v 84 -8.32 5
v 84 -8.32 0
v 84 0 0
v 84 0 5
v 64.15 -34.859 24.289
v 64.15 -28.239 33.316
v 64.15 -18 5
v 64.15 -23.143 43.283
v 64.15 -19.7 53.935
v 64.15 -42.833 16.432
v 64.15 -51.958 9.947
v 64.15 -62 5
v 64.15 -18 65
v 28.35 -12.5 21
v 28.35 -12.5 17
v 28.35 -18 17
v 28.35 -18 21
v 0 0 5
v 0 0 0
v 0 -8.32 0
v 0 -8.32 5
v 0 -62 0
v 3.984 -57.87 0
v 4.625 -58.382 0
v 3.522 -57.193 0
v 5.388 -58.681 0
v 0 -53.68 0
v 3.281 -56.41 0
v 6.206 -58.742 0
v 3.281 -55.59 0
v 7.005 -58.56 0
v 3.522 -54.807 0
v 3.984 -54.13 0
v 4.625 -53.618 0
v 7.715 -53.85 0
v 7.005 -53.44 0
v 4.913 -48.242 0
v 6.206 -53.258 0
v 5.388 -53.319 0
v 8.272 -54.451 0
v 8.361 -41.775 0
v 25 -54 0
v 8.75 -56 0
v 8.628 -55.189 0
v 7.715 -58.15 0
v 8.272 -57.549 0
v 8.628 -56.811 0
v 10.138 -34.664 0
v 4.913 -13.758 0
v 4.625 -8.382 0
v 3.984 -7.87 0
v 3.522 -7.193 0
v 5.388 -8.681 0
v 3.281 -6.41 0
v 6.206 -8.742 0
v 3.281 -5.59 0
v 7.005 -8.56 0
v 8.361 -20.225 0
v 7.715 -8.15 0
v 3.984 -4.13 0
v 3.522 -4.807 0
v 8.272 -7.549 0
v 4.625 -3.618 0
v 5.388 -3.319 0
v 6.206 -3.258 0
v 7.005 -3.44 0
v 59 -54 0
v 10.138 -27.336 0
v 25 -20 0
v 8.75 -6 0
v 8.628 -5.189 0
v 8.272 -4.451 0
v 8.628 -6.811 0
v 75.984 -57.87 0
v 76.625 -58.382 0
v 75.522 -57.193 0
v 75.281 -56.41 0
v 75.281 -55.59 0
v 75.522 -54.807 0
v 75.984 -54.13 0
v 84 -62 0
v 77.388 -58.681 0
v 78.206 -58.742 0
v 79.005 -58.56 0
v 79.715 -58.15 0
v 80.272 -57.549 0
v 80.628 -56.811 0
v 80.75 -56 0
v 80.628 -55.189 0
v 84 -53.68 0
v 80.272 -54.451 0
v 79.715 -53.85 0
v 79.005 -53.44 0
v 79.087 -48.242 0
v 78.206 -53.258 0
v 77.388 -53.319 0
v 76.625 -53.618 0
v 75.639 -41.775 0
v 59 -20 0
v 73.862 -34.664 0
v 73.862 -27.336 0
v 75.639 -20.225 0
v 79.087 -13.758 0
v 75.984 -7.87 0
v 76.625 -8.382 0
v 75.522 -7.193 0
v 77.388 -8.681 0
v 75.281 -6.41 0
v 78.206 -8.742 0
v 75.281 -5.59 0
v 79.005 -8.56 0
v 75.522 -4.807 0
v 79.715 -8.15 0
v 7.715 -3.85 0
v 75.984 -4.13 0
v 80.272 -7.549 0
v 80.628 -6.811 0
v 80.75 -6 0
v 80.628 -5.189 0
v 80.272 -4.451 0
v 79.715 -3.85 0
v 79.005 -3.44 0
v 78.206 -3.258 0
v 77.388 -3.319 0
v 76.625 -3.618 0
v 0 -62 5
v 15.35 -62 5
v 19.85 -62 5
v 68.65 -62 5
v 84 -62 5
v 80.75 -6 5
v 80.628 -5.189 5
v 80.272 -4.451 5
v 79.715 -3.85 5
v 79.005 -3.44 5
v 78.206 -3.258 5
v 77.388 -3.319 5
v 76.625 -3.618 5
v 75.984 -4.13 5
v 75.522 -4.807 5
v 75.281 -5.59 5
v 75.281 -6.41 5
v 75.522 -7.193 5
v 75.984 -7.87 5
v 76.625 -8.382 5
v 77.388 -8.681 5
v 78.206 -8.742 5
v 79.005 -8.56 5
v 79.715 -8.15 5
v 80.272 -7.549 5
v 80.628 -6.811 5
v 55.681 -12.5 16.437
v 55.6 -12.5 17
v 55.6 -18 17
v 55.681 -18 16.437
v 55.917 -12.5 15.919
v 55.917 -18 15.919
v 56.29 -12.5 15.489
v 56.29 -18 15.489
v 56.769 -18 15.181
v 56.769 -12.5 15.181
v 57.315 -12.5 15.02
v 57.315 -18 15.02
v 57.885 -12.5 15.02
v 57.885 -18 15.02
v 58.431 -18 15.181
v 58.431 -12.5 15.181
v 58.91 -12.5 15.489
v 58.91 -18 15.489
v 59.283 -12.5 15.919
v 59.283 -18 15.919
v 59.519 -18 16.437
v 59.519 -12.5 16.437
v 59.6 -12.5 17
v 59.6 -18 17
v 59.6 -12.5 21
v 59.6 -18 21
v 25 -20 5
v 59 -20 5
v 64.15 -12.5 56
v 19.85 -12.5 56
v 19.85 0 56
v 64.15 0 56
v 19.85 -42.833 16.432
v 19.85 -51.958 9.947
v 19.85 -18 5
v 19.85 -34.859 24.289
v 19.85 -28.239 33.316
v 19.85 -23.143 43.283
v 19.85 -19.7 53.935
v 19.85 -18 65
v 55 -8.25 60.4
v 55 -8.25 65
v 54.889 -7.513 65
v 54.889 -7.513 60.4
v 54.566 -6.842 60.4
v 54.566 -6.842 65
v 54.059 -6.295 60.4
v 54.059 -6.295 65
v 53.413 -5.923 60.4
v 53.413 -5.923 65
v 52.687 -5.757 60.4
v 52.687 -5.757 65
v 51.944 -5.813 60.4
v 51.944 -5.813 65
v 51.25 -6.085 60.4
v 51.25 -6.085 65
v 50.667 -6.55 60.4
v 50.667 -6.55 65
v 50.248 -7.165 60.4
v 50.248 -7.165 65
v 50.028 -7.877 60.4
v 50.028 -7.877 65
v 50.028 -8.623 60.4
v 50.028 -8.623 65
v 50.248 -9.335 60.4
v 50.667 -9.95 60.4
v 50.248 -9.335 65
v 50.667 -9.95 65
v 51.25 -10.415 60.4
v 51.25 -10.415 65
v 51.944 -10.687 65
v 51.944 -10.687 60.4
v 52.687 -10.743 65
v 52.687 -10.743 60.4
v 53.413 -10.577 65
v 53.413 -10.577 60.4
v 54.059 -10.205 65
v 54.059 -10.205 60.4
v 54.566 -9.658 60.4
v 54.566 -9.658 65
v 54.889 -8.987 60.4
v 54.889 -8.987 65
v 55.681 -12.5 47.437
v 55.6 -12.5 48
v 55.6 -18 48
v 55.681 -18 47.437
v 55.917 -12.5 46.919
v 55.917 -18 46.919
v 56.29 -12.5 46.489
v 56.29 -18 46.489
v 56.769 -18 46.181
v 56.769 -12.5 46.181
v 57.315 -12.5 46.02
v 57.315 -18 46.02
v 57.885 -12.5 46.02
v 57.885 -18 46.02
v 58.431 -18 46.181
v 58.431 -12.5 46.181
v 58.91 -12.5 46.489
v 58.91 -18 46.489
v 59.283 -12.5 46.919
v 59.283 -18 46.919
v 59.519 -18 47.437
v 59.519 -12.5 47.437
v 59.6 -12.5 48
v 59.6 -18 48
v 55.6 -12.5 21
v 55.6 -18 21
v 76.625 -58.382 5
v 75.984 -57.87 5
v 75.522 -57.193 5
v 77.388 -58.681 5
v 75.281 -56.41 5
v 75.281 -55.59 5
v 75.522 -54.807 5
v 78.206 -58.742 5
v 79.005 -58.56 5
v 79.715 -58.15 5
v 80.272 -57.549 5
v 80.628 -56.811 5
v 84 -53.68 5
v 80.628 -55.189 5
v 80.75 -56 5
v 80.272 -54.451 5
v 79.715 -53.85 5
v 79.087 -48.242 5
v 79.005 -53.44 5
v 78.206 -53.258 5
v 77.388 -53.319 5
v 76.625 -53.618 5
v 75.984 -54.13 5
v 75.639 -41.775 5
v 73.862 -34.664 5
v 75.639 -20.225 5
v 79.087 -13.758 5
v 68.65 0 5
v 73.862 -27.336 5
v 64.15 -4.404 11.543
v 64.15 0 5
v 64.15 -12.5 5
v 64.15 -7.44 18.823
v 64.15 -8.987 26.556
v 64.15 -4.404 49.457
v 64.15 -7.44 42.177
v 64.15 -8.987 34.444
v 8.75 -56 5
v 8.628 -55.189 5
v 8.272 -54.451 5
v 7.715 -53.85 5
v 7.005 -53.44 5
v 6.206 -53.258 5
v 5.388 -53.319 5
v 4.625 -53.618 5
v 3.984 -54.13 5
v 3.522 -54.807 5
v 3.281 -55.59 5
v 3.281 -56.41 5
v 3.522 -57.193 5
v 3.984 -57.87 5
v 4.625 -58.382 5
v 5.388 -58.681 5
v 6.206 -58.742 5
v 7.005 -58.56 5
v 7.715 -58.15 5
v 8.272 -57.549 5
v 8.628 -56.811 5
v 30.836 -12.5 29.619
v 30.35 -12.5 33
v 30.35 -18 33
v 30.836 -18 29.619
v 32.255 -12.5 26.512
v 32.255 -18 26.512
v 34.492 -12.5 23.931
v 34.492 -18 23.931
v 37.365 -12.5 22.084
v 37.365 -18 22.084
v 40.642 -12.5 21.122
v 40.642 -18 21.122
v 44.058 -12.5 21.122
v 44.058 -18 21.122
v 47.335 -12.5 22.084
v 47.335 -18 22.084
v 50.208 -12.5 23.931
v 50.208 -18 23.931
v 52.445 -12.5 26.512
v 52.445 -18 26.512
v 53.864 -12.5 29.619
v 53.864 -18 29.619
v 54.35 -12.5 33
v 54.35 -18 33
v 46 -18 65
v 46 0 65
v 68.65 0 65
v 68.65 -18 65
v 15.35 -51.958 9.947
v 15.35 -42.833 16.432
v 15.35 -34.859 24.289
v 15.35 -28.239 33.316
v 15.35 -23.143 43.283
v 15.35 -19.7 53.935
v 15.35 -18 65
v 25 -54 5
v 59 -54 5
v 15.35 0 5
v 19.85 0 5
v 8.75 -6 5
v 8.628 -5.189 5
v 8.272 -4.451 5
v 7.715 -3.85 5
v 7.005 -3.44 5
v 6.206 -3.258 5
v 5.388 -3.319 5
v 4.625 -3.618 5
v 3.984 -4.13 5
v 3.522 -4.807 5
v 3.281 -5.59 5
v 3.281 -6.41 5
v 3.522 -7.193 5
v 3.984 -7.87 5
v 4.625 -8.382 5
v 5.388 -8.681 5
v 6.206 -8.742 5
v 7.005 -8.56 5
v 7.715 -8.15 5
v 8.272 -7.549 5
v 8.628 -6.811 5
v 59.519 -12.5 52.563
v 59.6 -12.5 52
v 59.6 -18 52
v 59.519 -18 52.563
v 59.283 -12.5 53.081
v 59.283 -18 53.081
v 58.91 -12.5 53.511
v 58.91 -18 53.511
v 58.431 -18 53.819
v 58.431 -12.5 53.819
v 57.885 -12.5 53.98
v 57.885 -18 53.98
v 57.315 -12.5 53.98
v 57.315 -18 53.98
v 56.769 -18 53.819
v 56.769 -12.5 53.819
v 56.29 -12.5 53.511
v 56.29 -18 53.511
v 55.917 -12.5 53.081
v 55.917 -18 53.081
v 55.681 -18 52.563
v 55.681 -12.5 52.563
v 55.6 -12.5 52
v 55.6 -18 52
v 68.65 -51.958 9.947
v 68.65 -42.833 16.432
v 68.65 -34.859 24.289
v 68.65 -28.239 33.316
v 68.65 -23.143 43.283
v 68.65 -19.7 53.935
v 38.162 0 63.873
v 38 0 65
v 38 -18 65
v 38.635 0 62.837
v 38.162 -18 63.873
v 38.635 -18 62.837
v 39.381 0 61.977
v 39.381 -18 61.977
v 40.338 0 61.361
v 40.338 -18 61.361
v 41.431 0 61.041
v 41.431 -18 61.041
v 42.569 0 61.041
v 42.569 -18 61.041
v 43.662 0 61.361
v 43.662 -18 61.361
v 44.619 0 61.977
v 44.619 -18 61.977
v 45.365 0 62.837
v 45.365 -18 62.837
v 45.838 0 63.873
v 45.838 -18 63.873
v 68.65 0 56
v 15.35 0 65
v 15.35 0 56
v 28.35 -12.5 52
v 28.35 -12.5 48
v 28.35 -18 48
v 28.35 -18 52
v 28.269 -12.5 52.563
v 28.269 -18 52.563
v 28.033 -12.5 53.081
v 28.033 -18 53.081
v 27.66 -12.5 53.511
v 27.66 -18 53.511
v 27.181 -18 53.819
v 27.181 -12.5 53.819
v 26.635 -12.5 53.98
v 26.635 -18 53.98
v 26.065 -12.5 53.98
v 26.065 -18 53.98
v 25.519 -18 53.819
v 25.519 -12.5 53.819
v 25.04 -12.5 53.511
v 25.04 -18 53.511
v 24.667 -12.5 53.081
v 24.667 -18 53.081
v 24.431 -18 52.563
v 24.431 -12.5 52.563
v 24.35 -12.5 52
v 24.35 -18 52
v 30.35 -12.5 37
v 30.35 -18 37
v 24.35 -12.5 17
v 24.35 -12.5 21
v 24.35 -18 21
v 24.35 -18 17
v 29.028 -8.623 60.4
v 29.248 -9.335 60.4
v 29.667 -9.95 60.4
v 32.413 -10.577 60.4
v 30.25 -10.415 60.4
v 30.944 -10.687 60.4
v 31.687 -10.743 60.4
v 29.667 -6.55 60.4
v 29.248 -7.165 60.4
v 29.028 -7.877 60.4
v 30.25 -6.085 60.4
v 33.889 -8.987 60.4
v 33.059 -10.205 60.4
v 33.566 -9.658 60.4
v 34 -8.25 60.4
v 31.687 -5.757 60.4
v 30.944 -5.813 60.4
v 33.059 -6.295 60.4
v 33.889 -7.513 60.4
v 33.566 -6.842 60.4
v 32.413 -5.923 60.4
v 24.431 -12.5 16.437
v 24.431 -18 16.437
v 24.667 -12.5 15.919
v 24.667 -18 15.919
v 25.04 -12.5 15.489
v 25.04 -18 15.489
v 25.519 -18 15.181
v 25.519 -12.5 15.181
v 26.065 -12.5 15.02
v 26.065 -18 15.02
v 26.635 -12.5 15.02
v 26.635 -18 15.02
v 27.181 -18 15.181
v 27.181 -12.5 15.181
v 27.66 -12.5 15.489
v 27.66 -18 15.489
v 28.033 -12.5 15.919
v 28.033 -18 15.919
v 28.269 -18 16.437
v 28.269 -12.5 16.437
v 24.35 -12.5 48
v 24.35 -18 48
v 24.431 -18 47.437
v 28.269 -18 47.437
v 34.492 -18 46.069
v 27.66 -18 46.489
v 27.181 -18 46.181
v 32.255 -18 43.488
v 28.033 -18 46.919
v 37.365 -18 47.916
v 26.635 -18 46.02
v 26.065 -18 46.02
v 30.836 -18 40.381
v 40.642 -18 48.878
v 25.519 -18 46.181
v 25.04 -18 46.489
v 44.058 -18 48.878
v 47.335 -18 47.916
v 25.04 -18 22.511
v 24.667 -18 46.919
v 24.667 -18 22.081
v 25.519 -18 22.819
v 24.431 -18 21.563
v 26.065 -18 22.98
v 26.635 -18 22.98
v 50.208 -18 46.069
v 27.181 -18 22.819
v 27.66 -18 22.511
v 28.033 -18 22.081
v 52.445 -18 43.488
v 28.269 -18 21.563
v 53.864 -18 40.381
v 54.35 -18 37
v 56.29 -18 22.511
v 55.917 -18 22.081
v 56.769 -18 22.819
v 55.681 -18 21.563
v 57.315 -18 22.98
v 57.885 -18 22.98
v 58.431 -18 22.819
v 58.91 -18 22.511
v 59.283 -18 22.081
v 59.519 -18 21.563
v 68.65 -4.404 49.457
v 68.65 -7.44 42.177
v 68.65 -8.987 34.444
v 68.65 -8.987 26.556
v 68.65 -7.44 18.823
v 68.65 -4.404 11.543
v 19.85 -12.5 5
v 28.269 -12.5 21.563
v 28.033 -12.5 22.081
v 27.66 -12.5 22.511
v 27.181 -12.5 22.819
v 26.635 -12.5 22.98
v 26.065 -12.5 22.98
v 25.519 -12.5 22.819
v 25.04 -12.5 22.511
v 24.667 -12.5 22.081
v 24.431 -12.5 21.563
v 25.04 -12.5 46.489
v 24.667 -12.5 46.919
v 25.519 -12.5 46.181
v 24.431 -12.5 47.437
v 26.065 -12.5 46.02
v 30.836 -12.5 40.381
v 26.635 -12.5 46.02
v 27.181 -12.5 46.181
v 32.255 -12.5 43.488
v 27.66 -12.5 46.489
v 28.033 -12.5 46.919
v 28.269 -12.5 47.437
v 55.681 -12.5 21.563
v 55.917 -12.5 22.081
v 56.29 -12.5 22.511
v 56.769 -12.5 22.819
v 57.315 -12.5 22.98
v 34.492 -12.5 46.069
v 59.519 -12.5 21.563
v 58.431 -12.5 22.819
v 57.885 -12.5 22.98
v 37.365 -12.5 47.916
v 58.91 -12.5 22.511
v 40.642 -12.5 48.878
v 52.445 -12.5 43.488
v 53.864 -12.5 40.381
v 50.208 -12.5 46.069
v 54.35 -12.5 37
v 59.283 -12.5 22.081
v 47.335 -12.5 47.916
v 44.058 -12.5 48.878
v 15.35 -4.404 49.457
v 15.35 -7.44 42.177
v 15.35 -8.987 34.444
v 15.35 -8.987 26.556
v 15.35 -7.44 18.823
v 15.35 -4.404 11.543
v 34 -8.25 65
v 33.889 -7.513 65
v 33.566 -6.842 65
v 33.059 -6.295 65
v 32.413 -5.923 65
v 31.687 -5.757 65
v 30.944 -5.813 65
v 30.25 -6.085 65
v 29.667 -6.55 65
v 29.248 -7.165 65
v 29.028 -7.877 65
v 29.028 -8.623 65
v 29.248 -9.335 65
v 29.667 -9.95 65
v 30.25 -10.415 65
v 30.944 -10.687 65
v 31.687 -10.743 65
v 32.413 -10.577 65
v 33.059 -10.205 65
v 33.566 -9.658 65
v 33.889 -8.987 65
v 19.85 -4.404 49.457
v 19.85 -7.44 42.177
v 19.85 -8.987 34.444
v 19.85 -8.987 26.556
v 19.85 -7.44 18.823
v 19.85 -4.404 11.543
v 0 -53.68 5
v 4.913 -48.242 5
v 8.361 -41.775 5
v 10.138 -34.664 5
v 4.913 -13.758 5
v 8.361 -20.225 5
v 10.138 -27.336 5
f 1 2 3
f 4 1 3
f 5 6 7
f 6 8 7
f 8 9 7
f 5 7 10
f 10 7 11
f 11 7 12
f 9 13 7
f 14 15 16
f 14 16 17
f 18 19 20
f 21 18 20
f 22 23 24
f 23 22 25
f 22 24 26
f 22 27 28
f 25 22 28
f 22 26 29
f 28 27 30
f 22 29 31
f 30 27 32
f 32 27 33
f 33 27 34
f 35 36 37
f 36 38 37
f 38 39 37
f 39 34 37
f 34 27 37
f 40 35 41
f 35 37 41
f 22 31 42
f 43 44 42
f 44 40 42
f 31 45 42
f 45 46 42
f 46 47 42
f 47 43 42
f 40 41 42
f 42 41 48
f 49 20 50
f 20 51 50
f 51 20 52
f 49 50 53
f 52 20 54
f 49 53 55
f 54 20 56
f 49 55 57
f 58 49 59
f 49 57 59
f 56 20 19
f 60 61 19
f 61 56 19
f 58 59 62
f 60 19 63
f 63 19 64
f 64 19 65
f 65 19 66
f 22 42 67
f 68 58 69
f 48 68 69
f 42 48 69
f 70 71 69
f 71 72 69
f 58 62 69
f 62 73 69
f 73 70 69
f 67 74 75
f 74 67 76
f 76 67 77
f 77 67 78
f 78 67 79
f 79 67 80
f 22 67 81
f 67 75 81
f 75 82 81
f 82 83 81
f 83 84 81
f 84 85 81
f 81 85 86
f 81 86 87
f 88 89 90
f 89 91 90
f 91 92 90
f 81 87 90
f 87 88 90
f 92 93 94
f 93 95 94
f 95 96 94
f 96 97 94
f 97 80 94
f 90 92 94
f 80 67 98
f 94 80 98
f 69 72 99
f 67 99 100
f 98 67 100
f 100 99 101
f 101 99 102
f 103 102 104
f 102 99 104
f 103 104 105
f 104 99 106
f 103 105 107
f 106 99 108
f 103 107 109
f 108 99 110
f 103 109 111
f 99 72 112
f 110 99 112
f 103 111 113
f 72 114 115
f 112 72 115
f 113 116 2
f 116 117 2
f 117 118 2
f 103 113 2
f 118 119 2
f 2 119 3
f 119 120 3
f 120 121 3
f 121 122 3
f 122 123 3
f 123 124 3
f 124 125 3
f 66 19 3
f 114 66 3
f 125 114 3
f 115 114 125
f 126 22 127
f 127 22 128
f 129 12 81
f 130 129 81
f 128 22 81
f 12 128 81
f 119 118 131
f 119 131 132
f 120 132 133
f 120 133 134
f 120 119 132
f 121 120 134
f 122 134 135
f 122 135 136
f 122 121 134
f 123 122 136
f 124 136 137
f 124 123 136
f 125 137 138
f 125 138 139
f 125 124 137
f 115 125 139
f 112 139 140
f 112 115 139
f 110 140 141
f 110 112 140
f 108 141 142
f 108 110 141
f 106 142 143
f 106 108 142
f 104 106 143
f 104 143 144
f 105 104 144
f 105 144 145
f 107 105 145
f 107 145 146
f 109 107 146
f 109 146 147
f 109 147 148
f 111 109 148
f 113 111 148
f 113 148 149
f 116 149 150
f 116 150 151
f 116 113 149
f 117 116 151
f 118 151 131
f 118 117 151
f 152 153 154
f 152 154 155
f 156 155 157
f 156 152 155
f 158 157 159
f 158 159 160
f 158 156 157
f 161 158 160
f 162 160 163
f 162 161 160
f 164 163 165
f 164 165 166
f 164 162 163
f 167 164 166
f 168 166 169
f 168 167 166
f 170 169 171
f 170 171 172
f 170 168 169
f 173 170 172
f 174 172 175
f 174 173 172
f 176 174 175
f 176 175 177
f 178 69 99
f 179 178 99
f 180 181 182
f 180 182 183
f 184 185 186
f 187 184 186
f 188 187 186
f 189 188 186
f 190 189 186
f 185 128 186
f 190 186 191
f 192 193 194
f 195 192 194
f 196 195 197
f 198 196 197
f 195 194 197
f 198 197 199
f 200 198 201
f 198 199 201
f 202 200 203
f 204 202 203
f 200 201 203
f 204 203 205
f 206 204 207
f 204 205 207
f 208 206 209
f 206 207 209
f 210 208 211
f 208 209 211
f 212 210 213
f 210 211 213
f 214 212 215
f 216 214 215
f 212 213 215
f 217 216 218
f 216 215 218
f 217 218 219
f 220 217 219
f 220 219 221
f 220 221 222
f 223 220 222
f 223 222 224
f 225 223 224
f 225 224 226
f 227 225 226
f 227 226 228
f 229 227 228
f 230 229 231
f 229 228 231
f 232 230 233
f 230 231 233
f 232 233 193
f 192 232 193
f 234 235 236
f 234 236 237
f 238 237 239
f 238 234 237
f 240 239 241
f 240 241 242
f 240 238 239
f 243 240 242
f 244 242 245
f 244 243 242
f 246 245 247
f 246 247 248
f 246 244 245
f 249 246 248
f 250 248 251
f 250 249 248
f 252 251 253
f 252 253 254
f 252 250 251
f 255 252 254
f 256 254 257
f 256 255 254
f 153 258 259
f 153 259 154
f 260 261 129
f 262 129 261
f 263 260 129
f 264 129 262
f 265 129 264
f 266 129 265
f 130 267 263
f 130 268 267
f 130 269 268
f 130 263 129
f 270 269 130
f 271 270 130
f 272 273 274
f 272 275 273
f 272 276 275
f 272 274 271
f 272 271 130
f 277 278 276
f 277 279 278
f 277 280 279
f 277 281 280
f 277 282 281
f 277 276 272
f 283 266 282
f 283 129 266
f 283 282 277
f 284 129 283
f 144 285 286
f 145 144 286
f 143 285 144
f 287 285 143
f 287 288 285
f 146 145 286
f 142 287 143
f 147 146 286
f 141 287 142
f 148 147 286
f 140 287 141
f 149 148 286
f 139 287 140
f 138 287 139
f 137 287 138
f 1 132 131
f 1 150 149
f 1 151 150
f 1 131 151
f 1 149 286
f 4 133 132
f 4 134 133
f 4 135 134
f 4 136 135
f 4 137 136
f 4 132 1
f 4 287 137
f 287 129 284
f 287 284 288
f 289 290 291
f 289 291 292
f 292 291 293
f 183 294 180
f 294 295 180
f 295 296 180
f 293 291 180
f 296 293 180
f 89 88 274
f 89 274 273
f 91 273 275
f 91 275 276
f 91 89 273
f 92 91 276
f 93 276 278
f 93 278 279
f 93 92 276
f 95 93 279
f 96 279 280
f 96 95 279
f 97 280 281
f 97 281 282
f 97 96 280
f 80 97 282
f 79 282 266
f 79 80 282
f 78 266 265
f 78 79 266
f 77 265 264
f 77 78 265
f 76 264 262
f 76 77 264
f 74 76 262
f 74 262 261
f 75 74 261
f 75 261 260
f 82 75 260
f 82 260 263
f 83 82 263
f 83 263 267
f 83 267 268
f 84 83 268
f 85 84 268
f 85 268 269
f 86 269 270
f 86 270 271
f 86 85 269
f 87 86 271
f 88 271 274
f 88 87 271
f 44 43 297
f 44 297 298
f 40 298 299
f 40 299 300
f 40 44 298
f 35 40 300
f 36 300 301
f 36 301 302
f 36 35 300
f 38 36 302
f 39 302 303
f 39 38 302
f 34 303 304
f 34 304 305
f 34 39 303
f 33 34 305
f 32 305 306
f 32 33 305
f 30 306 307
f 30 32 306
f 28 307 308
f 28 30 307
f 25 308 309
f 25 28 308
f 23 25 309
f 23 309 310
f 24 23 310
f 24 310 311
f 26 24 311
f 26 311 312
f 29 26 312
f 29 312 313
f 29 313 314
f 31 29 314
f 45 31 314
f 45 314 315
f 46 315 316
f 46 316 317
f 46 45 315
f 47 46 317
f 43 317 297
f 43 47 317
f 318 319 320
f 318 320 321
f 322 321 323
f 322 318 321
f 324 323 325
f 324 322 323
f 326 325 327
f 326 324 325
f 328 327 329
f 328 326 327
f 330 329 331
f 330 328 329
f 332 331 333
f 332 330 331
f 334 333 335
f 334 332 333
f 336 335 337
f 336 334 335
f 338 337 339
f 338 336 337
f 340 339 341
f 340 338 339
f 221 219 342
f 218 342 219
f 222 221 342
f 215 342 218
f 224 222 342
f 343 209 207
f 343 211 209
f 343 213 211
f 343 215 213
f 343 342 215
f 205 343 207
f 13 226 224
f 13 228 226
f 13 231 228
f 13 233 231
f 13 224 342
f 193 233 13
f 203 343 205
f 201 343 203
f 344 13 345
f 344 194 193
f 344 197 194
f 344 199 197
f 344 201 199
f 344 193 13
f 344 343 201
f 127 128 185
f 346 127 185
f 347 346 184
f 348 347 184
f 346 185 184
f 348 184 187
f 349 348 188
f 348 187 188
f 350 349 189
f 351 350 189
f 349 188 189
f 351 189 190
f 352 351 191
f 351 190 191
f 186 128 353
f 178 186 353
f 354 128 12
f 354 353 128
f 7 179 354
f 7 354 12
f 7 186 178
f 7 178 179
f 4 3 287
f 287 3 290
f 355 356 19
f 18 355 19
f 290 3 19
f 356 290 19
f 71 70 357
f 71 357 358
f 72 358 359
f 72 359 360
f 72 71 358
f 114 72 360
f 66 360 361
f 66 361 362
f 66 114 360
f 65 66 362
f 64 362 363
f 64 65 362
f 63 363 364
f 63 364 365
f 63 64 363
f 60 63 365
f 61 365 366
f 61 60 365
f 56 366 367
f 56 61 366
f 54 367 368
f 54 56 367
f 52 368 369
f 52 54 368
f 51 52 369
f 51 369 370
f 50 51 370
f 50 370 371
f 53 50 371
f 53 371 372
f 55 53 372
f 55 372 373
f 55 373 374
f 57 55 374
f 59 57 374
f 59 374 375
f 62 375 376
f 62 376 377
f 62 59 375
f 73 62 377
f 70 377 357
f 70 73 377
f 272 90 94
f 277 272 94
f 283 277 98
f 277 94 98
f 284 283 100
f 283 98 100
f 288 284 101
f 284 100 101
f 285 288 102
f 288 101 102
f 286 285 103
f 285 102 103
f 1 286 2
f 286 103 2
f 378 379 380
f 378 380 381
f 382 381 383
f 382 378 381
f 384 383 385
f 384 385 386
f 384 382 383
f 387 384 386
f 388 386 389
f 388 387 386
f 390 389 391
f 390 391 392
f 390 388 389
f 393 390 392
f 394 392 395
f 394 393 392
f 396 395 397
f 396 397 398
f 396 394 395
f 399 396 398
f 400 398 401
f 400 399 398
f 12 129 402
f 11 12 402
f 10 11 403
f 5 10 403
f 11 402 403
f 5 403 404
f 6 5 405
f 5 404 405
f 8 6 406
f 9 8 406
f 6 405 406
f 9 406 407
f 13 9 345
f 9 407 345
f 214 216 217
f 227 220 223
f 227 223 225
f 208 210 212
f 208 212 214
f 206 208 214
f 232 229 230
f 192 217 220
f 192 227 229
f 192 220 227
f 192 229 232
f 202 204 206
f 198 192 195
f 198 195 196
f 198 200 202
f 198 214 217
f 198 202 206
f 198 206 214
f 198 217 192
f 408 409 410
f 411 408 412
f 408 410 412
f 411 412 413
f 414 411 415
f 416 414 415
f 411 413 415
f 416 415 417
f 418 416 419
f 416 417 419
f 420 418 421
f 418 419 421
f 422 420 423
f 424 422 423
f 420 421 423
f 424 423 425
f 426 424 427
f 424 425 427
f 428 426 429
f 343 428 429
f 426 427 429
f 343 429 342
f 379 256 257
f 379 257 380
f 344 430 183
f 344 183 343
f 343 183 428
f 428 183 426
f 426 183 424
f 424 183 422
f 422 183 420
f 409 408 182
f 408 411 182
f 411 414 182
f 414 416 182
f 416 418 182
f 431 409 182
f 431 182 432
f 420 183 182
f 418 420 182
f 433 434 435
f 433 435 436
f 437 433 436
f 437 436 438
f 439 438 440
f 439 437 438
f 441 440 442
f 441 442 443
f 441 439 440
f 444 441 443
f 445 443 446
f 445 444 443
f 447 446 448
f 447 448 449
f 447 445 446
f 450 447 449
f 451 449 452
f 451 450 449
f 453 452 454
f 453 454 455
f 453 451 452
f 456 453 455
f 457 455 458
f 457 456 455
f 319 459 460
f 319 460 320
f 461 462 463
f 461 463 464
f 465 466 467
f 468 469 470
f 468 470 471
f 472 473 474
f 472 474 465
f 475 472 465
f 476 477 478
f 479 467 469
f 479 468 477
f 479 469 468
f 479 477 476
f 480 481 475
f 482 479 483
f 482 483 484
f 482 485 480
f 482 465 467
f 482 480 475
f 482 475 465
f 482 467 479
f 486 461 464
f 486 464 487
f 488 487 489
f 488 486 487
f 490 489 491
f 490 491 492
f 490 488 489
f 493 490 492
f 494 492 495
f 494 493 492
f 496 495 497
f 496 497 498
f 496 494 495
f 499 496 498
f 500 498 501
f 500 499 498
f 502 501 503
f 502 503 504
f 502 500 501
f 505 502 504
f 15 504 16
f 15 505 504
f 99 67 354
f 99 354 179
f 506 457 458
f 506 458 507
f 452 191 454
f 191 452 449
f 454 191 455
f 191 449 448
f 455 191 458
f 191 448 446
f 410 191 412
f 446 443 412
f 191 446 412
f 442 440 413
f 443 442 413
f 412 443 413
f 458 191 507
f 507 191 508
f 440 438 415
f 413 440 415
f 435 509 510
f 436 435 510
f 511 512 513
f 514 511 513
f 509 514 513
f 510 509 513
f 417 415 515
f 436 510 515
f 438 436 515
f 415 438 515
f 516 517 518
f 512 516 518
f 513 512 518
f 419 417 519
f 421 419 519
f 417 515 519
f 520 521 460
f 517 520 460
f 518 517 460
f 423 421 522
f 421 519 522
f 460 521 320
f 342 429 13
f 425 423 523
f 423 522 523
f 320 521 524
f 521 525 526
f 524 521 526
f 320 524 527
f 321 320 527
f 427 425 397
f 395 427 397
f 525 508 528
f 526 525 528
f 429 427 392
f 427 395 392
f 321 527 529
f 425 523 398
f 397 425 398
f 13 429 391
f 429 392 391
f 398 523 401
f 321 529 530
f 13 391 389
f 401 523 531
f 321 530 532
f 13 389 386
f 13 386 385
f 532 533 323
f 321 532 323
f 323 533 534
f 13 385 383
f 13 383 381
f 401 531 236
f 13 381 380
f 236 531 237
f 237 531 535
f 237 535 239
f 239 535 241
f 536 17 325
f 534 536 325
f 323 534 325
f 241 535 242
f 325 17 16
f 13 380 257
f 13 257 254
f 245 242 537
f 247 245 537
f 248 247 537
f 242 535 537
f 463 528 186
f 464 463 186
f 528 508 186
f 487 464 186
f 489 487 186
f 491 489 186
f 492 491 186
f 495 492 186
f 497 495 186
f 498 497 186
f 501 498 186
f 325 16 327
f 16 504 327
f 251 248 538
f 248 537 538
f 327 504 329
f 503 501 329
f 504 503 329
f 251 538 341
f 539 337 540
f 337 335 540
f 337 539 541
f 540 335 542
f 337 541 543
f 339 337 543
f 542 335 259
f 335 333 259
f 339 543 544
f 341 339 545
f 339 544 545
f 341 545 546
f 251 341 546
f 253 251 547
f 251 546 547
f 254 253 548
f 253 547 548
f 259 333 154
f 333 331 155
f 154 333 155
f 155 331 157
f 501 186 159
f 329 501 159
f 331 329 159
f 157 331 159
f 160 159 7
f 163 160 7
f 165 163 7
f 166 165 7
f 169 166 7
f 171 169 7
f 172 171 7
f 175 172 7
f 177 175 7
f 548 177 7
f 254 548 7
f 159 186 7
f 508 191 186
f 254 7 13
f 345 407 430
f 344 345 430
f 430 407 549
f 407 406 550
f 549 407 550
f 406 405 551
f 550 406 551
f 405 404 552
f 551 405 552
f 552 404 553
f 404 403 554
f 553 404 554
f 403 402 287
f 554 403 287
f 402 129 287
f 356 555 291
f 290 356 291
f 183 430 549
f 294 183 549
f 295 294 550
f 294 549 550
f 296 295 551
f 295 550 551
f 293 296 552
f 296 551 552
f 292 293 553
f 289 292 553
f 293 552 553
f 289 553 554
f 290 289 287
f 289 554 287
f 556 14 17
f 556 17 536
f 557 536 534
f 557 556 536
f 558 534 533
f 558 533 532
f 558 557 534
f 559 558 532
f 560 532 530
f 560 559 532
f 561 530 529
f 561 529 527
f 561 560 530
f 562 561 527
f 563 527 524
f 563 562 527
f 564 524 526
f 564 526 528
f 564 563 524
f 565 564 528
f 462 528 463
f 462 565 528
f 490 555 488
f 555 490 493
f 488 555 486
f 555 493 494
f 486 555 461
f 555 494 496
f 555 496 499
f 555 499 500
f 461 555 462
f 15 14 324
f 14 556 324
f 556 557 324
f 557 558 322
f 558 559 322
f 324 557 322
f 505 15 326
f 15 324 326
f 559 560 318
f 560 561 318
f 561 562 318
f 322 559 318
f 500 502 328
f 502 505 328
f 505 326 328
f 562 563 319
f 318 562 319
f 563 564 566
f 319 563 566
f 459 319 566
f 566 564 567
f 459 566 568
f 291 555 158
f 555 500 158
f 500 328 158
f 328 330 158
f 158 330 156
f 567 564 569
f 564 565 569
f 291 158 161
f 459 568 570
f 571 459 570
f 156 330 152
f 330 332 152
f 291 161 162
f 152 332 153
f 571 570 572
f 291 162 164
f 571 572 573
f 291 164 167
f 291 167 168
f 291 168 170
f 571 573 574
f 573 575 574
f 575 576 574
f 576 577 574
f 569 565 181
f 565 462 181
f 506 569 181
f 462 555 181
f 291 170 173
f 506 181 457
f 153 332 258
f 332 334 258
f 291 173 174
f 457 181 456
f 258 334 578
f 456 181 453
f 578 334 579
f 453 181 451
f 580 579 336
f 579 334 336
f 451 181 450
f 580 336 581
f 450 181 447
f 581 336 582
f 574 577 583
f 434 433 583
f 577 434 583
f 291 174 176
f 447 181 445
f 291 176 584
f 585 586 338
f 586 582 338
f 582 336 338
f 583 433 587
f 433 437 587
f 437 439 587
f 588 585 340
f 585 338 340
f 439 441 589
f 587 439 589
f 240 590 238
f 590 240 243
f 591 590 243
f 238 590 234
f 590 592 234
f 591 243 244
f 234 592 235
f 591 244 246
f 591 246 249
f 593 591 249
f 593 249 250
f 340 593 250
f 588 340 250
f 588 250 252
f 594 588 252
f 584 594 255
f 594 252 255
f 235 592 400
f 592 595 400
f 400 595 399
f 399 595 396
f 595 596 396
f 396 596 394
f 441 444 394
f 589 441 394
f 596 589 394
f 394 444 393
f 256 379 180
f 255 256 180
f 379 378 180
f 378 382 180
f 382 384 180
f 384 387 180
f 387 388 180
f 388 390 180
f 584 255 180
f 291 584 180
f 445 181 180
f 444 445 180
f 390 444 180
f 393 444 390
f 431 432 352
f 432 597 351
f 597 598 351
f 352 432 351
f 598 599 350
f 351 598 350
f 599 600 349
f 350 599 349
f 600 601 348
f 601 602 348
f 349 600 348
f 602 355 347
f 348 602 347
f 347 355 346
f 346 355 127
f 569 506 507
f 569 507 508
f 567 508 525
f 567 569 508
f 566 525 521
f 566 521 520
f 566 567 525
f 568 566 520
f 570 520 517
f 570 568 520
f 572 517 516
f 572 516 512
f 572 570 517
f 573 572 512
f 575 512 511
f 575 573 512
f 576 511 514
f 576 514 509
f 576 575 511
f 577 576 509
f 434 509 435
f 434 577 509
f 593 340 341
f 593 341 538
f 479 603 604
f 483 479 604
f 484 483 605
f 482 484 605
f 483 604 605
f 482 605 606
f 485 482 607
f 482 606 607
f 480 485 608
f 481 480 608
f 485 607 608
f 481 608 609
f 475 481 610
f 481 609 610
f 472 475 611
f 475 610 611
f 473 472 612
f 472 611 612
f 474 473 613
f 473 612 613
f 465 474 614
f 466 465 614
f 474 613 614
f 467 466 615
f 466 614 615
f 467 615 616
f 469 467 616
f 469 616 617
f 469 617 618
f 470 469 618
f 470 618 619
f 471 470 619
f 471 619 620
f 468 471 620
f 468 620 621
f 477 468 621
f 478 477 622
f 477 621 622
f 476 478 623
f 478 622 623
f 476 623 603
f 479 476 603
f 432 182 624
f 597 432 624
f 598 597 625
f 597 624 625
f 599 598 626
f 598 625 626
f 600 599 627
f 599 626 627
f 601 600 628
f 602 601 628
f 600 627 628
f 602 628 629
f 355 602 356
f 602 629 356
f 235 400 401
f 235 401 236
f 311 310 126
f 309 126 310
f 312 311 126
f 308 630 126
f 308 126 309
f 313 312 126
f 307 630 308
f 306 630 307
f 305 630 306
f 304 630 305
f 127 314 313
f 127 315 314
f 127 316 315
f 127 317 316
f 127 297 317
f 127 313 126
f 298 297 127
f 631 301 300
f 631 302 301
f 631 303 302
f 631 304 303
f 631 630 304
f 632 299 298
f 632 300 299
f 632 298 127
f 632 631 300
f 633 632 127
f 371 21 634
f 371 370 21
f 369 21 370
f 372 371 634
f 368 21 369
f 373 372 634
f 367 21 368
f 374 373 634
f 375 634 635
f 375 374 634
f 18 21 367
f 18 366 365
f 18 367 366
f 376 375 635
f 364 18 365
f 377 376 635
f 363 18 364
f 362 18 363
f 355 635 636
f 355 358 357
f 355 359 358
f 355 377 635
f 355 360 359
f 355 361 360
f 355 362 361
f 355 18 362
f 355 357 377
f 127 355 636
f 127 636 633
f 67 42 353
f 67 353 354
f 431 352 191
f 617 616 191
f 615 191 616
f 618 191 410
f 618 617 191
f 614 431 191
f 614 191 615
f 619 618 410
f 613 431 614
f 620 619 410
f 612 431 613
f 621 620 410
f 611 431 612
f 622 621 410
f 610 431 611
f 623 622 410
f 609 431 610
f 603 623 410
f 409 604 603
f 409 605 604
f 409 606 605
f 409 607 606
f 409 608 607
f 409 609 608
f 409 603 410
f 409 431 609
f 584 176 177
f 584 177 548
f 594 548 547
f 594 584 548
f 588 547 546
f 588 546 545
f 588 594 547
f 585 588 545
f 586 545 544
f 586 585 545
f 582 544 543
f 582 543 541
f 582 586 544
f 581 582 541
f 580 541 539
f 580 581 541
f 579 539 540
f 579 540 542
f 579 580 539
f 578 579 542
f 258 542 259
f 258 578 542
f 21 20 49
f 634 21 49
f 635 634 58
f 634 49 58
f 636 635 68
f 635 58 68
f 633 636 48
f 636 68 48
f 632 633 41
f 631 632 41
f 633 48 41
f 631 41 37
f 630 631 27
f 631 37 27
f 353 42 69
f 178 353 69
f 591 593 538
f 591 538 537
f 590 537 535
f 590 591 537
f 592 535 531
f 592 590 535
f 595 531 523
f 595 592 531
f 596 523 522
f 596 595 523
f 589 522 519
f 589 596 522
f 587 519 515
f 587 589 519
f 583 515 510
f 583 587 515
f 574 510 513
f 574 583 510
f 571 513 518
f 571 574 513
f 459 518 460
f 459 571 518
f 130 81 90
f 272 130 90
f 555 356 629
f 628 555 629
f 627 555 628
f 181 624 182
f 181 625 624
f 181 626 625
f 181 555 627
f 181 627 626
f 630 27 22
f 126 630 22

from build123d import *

# Parameters (mm, degrees)
SKETCH2_R                = 2.75
SKETCH2_W                = 34
SKETCH2_H                = 34
BOSS_EXTRUDE1_DEPTH      = 5
SKETCH3_W                = 4.5
SKETCH3_H                = 44
SKETCH3_H_2              = 18
SKETCH3_W_2              = 44.3
BOSS_EXTRUDE2_DEPTH      = 60
CUT_EXTRUDE1_DEPTH       = 16.35
CUT_EXTRUDE1_DEPTH_BACK  = 60
CUT_EXTRUDE3_DEPTH       = 16.35
CUT_EXTRUDE3_DEPTH_BACK  = 60
CUT_EXTRUDE6_REACH       = 25.5
CUT_EXTRUDE6_START       = -5.5
SKETCH9_W                = 44.3
SKETCH9_H                = 51
CUT_EXTRUDE7_DEPTH       = 5.5
LPATTERN1_COUNT          = 2
LPATTERN1_PITCH          = 31.25
LPATTERN2_COUNT          = 2
LPATTERN2_PITCH          = 31
LPATTERN2_COPY_1_DEPTH   = 5.5
CUT_EXTRUDE8_DEPTH       = 10
CUT_EXTRUDE10_DEPTH      = 45
CUT_EXTRUDE10_DEPTH_BACK = 19
SKETCH15_R               = 2.5
CUT_EXTRUDE11_DEPTH      = 4.6
LPATTERN3_COUNT          = 2
LPATTERN3_PITCH          = 21


with BuildPart() as part:
    # Sketch2 → Boss-Extrude1 (new body)
    with BuildSketch(Plane.XY):
        with BuildLine():
            Line((0, -53.68), (0, -62))
            Line((0, -62), (84, -62))
            Line((84, -62), (84, -53.68))
            ThreePointArc((84, -53.68), (73.637148469, -31), (84, -8.32))
            Line((84, -8.32), (84, 0))
            Line((84, 0), (0, 0))
            Line((0, 0), (0, -8.32))
            ThreePointArc((0, -8.32), (10.362851531, -31), (0, -53.68))
        make_face()
        with Locations((6, -6)):
            Circle(SKETCH2_R, mode=Mode.SUBTRACT)
        with Locations((78, -56)):
            Circle(SKETCH2_R, mode=Mode.SUBTRACT)
        with Locations((6, -56)):
            Circle(SKETCH2_R, mode=Mode.SUBTRACT)
        with Locations((78, -6)):
            Circle(SKETCH2_R, mode=Mode.SUBTRACT)
        with Locations((42, -37)):
            Rectangle(SKETCH2_W, SKETCH2_H, mode=Mode.SUBTRACT)
    extrude(amount=BOSS_EXTRUDE1_DEPTH)

    # Sketch3 → Boss-Extrude2 (add)
    with BuildSketch(Plane.XY.offset(5)):
        with Locations((17.6, -40)):
            Rectangle(SKETCH3_W, SKETCH3_H)
        with Locations((66.4, -40)):
            Rectangle(SKETCH3_W, SKETCH3_H)
        with Locations((66.4, -9)):
            Rectangle(SKETCH3_W, SKETCH3_H_2)
        with Locations((17.6, -9)):
            Rectangle(SKETCH3_W, SKETCH3_H_2)
        with Locations((42, -9)):
            Rectangle(SKETCH3_W_2, SKETCH3_H_2)
    extrude(amount=BOSS_EXTRUDE2_DEPTH)

    # Sketch6 → Cut-Extrude1 (cut, two sides)
    with BuildSketch(Plane(origin=(68.65, 0, 0), x_dir=(0, 0, -1), z_dir=(1, 0, 0))) as cut_extrude1_sk:
        with BuildLine():
            Line((62.328372383, -231.688052054), (-5, -62))
            ThreePointArc((-5, -62), (-28.669965475, -31.368134738), (-65, -18))
            Line((-65, -18), (-247.078635565, -4.789579558))
            Line((-247.078635565, -4.789579558), (-462.994068413, -299.219715259))
            Line((-462.994068413, -299.219715259), (-153.587060464, -526.118187755))
            Line((-153.587060464, -526.118187755), (62.328372383, -231.688052054))
        make_face()
    extrude(amount=CUT_EXTRUDE1_DEPTH, mode=Mode.SUBTRACT)
    extrude(cut_extrude1_sk.sketch, amount=-CUT_EXTRUDE1_DEPTH_BACK, mode=Mode.SUBTRACT)

    # Sketch7 → Cut-Extrude3 (cut, two sides)
    with BuildSketch(Plane(origin=(68.65, 0, 0), x_dir=(0, 0, -1), z_dir=(1, 0, 0))) as cut_extrude3_sk:
        with BuildLine():
            ThreePointArc((-56, 0), (-30.5, -9.181985788), (-5, 0))
            Line((-5, 0), (-56, 0))
        make_face()
    extrude(amount=CUT_EXTRUDE3_DEPTH, mode=Mode.SUBTRACT)
    extrude(cut_extrude3_sk.sketch, amount=-CUT_EXTRUDE3_DEPTH_BACK, mode=Mode.SUBTRACT)

    # Sketch9 → Cut-Extrude6 (cut, up to next)
    with BuildSketch(Plane.XZ.offset(18).offset(CUT_EXTRUDE6_START), mode=Mode.PRIVATE) as cut_extrude6_sk1:
        with Locations((42, 30.5)):
            Rectangle(SKETCH9_W, SKETCH9_H)
    cut_extrude6_tool1 = extrude(cut_extrude6_sk1.sketch, amount=-CUT_EXTRUDE6_REACH, mode=Mode.PRIVATE) & part.part
    add(cut_extrude6_tool1.solids().sort_by_distance((42, -12.5, 30.5))[0], mode=Mode.SUBTRACT)

    # Sketch10 → Cut-Extrude7 (cut)
    with BuildSketch(Plane(origin=(0, -12.5, 0), x_dir=(1, 0, 0), z_dir=(0, 1, 0))):
        with BuildLine():
            Line((28.35, -17), (28.35, -21))
            ThreePointArc((28.35, -21), (26.35, -23), (24.35, -21))
            Line((24.35, -21), (24.35, -17))
            ThreePointArc((24.35, -17), (26.35, -15), (28.35, -17))
        make_face()
    cut_extrude7 = extrude(amount=-CUT_EXTRUDE7_DEPTH, mode=Mode.SUBTRACT)

    # LPattern1: Cut-Extrude7 ×2
    with Locations(*[(i * LPATTERN1_PITCH, 0, 0) for i in range(1, LPATTERN1_COUNT)]):
        add(cut_extrude7, mode=Mode.SUBTRACT)

    # LPattern2: Cut-Extrude7 ×2
    with Locations(*[(0, 0, i * LPATTERN2_PITCH) for i in range(1, LPATTERN2_COUNT)]):
        add(cut_extrude7, mode=Mode.SUBTRACT)

    # LPattern2 copy 1 sketch → LPattern2 copy 1 (cut)
    with BuildSketch(Plane(origin=(31.25, -12.5, 31), x_dir=(1, 0, 0), z_dir=(0, 1, 0))):
        with BuildLine():
            Line((28.35, -17), (28.35, -21))
            ThreePointArc((28.35, -21), (26.35, -23), (24.35, -21))
            Line((24.35, -21), (24.35, -17))
            ThreePointArc((24.35, -17), (26.35, -15), (28.35, -17))
        make_face()
    extrude(amount=-LPATTERN2_COPY_1_DEPTH, mode=Mode.SUBTRACT)

    # Sketch11 → Cut-Extrude8 (cut)
    with BuildSketch(Plane(origin=(0, -12.5, 0), x_dir=(1, 0, 0), z_dir=(0, 1, 0))):
        with BuildLine():
            Line((54.35, -33), (54.35, -37))
            ThreePointArc((54.35, -37), (42.35, -49), (30.35, -37))
            Line((30.35, -37), (30.35, -33))
            ThreePointArc((30.35, -33), (42.35, -21), (54.35, -33))
        make_face()
    extrude(amount=-CUT_EXTRUDE8_DEPTH, mode=Mode.SUBTRACT)

    # Sketch14 → Cut-Extrude10 (cut, two sides)
    with BuildSketch(Plane.XZ.offset(18)) as cut_extrude10_sk:
        with BuildLine():
            Line((38, 234.260792413), (38, 65))
            ThreePointArc((38, 65), (42, 61), (46, 65))
            Line((46, 65), (46, 234.260792413))
            Line((46, 234.260792413), (46, 572.782377239))
            Line((46, 572.782377239), (38, 572.782377239))
            Line((38, 572.782377239), (38, 234.260792413))
        make_face()
    extrude(amount=CUT_EXTRUDE10_DEPTH, mode=Mode.SUBTRACT)
    extrude(cut_extrude10_sk.sketch, amount=-CUT_EXTRUDE10_DEPTH_BACK, mode=Mode.SUBTRACT)

    # Sketch15 → Cut-Extrude11 (cut)
    with BuildSketch(Plane.XY.offset(65)):
        with Locations((31.5, -8.25)):
            Circle(SKETCH15_R)
    cut_extrude11 = extrude(amount=-CUT_EXTRUDE11_DEPTH, mode=Mode.SUBTRACT)

    # LPattern3: Cut-Extrude11 ×2
    with Locations(*[(i * LPATTERN3_PITCH, 0, 0) for i in range(1, LPATTERN3_COUNT)]):
        add(cut_extrude11, mode=Mode.SUBTRACT)


solid = part.part
